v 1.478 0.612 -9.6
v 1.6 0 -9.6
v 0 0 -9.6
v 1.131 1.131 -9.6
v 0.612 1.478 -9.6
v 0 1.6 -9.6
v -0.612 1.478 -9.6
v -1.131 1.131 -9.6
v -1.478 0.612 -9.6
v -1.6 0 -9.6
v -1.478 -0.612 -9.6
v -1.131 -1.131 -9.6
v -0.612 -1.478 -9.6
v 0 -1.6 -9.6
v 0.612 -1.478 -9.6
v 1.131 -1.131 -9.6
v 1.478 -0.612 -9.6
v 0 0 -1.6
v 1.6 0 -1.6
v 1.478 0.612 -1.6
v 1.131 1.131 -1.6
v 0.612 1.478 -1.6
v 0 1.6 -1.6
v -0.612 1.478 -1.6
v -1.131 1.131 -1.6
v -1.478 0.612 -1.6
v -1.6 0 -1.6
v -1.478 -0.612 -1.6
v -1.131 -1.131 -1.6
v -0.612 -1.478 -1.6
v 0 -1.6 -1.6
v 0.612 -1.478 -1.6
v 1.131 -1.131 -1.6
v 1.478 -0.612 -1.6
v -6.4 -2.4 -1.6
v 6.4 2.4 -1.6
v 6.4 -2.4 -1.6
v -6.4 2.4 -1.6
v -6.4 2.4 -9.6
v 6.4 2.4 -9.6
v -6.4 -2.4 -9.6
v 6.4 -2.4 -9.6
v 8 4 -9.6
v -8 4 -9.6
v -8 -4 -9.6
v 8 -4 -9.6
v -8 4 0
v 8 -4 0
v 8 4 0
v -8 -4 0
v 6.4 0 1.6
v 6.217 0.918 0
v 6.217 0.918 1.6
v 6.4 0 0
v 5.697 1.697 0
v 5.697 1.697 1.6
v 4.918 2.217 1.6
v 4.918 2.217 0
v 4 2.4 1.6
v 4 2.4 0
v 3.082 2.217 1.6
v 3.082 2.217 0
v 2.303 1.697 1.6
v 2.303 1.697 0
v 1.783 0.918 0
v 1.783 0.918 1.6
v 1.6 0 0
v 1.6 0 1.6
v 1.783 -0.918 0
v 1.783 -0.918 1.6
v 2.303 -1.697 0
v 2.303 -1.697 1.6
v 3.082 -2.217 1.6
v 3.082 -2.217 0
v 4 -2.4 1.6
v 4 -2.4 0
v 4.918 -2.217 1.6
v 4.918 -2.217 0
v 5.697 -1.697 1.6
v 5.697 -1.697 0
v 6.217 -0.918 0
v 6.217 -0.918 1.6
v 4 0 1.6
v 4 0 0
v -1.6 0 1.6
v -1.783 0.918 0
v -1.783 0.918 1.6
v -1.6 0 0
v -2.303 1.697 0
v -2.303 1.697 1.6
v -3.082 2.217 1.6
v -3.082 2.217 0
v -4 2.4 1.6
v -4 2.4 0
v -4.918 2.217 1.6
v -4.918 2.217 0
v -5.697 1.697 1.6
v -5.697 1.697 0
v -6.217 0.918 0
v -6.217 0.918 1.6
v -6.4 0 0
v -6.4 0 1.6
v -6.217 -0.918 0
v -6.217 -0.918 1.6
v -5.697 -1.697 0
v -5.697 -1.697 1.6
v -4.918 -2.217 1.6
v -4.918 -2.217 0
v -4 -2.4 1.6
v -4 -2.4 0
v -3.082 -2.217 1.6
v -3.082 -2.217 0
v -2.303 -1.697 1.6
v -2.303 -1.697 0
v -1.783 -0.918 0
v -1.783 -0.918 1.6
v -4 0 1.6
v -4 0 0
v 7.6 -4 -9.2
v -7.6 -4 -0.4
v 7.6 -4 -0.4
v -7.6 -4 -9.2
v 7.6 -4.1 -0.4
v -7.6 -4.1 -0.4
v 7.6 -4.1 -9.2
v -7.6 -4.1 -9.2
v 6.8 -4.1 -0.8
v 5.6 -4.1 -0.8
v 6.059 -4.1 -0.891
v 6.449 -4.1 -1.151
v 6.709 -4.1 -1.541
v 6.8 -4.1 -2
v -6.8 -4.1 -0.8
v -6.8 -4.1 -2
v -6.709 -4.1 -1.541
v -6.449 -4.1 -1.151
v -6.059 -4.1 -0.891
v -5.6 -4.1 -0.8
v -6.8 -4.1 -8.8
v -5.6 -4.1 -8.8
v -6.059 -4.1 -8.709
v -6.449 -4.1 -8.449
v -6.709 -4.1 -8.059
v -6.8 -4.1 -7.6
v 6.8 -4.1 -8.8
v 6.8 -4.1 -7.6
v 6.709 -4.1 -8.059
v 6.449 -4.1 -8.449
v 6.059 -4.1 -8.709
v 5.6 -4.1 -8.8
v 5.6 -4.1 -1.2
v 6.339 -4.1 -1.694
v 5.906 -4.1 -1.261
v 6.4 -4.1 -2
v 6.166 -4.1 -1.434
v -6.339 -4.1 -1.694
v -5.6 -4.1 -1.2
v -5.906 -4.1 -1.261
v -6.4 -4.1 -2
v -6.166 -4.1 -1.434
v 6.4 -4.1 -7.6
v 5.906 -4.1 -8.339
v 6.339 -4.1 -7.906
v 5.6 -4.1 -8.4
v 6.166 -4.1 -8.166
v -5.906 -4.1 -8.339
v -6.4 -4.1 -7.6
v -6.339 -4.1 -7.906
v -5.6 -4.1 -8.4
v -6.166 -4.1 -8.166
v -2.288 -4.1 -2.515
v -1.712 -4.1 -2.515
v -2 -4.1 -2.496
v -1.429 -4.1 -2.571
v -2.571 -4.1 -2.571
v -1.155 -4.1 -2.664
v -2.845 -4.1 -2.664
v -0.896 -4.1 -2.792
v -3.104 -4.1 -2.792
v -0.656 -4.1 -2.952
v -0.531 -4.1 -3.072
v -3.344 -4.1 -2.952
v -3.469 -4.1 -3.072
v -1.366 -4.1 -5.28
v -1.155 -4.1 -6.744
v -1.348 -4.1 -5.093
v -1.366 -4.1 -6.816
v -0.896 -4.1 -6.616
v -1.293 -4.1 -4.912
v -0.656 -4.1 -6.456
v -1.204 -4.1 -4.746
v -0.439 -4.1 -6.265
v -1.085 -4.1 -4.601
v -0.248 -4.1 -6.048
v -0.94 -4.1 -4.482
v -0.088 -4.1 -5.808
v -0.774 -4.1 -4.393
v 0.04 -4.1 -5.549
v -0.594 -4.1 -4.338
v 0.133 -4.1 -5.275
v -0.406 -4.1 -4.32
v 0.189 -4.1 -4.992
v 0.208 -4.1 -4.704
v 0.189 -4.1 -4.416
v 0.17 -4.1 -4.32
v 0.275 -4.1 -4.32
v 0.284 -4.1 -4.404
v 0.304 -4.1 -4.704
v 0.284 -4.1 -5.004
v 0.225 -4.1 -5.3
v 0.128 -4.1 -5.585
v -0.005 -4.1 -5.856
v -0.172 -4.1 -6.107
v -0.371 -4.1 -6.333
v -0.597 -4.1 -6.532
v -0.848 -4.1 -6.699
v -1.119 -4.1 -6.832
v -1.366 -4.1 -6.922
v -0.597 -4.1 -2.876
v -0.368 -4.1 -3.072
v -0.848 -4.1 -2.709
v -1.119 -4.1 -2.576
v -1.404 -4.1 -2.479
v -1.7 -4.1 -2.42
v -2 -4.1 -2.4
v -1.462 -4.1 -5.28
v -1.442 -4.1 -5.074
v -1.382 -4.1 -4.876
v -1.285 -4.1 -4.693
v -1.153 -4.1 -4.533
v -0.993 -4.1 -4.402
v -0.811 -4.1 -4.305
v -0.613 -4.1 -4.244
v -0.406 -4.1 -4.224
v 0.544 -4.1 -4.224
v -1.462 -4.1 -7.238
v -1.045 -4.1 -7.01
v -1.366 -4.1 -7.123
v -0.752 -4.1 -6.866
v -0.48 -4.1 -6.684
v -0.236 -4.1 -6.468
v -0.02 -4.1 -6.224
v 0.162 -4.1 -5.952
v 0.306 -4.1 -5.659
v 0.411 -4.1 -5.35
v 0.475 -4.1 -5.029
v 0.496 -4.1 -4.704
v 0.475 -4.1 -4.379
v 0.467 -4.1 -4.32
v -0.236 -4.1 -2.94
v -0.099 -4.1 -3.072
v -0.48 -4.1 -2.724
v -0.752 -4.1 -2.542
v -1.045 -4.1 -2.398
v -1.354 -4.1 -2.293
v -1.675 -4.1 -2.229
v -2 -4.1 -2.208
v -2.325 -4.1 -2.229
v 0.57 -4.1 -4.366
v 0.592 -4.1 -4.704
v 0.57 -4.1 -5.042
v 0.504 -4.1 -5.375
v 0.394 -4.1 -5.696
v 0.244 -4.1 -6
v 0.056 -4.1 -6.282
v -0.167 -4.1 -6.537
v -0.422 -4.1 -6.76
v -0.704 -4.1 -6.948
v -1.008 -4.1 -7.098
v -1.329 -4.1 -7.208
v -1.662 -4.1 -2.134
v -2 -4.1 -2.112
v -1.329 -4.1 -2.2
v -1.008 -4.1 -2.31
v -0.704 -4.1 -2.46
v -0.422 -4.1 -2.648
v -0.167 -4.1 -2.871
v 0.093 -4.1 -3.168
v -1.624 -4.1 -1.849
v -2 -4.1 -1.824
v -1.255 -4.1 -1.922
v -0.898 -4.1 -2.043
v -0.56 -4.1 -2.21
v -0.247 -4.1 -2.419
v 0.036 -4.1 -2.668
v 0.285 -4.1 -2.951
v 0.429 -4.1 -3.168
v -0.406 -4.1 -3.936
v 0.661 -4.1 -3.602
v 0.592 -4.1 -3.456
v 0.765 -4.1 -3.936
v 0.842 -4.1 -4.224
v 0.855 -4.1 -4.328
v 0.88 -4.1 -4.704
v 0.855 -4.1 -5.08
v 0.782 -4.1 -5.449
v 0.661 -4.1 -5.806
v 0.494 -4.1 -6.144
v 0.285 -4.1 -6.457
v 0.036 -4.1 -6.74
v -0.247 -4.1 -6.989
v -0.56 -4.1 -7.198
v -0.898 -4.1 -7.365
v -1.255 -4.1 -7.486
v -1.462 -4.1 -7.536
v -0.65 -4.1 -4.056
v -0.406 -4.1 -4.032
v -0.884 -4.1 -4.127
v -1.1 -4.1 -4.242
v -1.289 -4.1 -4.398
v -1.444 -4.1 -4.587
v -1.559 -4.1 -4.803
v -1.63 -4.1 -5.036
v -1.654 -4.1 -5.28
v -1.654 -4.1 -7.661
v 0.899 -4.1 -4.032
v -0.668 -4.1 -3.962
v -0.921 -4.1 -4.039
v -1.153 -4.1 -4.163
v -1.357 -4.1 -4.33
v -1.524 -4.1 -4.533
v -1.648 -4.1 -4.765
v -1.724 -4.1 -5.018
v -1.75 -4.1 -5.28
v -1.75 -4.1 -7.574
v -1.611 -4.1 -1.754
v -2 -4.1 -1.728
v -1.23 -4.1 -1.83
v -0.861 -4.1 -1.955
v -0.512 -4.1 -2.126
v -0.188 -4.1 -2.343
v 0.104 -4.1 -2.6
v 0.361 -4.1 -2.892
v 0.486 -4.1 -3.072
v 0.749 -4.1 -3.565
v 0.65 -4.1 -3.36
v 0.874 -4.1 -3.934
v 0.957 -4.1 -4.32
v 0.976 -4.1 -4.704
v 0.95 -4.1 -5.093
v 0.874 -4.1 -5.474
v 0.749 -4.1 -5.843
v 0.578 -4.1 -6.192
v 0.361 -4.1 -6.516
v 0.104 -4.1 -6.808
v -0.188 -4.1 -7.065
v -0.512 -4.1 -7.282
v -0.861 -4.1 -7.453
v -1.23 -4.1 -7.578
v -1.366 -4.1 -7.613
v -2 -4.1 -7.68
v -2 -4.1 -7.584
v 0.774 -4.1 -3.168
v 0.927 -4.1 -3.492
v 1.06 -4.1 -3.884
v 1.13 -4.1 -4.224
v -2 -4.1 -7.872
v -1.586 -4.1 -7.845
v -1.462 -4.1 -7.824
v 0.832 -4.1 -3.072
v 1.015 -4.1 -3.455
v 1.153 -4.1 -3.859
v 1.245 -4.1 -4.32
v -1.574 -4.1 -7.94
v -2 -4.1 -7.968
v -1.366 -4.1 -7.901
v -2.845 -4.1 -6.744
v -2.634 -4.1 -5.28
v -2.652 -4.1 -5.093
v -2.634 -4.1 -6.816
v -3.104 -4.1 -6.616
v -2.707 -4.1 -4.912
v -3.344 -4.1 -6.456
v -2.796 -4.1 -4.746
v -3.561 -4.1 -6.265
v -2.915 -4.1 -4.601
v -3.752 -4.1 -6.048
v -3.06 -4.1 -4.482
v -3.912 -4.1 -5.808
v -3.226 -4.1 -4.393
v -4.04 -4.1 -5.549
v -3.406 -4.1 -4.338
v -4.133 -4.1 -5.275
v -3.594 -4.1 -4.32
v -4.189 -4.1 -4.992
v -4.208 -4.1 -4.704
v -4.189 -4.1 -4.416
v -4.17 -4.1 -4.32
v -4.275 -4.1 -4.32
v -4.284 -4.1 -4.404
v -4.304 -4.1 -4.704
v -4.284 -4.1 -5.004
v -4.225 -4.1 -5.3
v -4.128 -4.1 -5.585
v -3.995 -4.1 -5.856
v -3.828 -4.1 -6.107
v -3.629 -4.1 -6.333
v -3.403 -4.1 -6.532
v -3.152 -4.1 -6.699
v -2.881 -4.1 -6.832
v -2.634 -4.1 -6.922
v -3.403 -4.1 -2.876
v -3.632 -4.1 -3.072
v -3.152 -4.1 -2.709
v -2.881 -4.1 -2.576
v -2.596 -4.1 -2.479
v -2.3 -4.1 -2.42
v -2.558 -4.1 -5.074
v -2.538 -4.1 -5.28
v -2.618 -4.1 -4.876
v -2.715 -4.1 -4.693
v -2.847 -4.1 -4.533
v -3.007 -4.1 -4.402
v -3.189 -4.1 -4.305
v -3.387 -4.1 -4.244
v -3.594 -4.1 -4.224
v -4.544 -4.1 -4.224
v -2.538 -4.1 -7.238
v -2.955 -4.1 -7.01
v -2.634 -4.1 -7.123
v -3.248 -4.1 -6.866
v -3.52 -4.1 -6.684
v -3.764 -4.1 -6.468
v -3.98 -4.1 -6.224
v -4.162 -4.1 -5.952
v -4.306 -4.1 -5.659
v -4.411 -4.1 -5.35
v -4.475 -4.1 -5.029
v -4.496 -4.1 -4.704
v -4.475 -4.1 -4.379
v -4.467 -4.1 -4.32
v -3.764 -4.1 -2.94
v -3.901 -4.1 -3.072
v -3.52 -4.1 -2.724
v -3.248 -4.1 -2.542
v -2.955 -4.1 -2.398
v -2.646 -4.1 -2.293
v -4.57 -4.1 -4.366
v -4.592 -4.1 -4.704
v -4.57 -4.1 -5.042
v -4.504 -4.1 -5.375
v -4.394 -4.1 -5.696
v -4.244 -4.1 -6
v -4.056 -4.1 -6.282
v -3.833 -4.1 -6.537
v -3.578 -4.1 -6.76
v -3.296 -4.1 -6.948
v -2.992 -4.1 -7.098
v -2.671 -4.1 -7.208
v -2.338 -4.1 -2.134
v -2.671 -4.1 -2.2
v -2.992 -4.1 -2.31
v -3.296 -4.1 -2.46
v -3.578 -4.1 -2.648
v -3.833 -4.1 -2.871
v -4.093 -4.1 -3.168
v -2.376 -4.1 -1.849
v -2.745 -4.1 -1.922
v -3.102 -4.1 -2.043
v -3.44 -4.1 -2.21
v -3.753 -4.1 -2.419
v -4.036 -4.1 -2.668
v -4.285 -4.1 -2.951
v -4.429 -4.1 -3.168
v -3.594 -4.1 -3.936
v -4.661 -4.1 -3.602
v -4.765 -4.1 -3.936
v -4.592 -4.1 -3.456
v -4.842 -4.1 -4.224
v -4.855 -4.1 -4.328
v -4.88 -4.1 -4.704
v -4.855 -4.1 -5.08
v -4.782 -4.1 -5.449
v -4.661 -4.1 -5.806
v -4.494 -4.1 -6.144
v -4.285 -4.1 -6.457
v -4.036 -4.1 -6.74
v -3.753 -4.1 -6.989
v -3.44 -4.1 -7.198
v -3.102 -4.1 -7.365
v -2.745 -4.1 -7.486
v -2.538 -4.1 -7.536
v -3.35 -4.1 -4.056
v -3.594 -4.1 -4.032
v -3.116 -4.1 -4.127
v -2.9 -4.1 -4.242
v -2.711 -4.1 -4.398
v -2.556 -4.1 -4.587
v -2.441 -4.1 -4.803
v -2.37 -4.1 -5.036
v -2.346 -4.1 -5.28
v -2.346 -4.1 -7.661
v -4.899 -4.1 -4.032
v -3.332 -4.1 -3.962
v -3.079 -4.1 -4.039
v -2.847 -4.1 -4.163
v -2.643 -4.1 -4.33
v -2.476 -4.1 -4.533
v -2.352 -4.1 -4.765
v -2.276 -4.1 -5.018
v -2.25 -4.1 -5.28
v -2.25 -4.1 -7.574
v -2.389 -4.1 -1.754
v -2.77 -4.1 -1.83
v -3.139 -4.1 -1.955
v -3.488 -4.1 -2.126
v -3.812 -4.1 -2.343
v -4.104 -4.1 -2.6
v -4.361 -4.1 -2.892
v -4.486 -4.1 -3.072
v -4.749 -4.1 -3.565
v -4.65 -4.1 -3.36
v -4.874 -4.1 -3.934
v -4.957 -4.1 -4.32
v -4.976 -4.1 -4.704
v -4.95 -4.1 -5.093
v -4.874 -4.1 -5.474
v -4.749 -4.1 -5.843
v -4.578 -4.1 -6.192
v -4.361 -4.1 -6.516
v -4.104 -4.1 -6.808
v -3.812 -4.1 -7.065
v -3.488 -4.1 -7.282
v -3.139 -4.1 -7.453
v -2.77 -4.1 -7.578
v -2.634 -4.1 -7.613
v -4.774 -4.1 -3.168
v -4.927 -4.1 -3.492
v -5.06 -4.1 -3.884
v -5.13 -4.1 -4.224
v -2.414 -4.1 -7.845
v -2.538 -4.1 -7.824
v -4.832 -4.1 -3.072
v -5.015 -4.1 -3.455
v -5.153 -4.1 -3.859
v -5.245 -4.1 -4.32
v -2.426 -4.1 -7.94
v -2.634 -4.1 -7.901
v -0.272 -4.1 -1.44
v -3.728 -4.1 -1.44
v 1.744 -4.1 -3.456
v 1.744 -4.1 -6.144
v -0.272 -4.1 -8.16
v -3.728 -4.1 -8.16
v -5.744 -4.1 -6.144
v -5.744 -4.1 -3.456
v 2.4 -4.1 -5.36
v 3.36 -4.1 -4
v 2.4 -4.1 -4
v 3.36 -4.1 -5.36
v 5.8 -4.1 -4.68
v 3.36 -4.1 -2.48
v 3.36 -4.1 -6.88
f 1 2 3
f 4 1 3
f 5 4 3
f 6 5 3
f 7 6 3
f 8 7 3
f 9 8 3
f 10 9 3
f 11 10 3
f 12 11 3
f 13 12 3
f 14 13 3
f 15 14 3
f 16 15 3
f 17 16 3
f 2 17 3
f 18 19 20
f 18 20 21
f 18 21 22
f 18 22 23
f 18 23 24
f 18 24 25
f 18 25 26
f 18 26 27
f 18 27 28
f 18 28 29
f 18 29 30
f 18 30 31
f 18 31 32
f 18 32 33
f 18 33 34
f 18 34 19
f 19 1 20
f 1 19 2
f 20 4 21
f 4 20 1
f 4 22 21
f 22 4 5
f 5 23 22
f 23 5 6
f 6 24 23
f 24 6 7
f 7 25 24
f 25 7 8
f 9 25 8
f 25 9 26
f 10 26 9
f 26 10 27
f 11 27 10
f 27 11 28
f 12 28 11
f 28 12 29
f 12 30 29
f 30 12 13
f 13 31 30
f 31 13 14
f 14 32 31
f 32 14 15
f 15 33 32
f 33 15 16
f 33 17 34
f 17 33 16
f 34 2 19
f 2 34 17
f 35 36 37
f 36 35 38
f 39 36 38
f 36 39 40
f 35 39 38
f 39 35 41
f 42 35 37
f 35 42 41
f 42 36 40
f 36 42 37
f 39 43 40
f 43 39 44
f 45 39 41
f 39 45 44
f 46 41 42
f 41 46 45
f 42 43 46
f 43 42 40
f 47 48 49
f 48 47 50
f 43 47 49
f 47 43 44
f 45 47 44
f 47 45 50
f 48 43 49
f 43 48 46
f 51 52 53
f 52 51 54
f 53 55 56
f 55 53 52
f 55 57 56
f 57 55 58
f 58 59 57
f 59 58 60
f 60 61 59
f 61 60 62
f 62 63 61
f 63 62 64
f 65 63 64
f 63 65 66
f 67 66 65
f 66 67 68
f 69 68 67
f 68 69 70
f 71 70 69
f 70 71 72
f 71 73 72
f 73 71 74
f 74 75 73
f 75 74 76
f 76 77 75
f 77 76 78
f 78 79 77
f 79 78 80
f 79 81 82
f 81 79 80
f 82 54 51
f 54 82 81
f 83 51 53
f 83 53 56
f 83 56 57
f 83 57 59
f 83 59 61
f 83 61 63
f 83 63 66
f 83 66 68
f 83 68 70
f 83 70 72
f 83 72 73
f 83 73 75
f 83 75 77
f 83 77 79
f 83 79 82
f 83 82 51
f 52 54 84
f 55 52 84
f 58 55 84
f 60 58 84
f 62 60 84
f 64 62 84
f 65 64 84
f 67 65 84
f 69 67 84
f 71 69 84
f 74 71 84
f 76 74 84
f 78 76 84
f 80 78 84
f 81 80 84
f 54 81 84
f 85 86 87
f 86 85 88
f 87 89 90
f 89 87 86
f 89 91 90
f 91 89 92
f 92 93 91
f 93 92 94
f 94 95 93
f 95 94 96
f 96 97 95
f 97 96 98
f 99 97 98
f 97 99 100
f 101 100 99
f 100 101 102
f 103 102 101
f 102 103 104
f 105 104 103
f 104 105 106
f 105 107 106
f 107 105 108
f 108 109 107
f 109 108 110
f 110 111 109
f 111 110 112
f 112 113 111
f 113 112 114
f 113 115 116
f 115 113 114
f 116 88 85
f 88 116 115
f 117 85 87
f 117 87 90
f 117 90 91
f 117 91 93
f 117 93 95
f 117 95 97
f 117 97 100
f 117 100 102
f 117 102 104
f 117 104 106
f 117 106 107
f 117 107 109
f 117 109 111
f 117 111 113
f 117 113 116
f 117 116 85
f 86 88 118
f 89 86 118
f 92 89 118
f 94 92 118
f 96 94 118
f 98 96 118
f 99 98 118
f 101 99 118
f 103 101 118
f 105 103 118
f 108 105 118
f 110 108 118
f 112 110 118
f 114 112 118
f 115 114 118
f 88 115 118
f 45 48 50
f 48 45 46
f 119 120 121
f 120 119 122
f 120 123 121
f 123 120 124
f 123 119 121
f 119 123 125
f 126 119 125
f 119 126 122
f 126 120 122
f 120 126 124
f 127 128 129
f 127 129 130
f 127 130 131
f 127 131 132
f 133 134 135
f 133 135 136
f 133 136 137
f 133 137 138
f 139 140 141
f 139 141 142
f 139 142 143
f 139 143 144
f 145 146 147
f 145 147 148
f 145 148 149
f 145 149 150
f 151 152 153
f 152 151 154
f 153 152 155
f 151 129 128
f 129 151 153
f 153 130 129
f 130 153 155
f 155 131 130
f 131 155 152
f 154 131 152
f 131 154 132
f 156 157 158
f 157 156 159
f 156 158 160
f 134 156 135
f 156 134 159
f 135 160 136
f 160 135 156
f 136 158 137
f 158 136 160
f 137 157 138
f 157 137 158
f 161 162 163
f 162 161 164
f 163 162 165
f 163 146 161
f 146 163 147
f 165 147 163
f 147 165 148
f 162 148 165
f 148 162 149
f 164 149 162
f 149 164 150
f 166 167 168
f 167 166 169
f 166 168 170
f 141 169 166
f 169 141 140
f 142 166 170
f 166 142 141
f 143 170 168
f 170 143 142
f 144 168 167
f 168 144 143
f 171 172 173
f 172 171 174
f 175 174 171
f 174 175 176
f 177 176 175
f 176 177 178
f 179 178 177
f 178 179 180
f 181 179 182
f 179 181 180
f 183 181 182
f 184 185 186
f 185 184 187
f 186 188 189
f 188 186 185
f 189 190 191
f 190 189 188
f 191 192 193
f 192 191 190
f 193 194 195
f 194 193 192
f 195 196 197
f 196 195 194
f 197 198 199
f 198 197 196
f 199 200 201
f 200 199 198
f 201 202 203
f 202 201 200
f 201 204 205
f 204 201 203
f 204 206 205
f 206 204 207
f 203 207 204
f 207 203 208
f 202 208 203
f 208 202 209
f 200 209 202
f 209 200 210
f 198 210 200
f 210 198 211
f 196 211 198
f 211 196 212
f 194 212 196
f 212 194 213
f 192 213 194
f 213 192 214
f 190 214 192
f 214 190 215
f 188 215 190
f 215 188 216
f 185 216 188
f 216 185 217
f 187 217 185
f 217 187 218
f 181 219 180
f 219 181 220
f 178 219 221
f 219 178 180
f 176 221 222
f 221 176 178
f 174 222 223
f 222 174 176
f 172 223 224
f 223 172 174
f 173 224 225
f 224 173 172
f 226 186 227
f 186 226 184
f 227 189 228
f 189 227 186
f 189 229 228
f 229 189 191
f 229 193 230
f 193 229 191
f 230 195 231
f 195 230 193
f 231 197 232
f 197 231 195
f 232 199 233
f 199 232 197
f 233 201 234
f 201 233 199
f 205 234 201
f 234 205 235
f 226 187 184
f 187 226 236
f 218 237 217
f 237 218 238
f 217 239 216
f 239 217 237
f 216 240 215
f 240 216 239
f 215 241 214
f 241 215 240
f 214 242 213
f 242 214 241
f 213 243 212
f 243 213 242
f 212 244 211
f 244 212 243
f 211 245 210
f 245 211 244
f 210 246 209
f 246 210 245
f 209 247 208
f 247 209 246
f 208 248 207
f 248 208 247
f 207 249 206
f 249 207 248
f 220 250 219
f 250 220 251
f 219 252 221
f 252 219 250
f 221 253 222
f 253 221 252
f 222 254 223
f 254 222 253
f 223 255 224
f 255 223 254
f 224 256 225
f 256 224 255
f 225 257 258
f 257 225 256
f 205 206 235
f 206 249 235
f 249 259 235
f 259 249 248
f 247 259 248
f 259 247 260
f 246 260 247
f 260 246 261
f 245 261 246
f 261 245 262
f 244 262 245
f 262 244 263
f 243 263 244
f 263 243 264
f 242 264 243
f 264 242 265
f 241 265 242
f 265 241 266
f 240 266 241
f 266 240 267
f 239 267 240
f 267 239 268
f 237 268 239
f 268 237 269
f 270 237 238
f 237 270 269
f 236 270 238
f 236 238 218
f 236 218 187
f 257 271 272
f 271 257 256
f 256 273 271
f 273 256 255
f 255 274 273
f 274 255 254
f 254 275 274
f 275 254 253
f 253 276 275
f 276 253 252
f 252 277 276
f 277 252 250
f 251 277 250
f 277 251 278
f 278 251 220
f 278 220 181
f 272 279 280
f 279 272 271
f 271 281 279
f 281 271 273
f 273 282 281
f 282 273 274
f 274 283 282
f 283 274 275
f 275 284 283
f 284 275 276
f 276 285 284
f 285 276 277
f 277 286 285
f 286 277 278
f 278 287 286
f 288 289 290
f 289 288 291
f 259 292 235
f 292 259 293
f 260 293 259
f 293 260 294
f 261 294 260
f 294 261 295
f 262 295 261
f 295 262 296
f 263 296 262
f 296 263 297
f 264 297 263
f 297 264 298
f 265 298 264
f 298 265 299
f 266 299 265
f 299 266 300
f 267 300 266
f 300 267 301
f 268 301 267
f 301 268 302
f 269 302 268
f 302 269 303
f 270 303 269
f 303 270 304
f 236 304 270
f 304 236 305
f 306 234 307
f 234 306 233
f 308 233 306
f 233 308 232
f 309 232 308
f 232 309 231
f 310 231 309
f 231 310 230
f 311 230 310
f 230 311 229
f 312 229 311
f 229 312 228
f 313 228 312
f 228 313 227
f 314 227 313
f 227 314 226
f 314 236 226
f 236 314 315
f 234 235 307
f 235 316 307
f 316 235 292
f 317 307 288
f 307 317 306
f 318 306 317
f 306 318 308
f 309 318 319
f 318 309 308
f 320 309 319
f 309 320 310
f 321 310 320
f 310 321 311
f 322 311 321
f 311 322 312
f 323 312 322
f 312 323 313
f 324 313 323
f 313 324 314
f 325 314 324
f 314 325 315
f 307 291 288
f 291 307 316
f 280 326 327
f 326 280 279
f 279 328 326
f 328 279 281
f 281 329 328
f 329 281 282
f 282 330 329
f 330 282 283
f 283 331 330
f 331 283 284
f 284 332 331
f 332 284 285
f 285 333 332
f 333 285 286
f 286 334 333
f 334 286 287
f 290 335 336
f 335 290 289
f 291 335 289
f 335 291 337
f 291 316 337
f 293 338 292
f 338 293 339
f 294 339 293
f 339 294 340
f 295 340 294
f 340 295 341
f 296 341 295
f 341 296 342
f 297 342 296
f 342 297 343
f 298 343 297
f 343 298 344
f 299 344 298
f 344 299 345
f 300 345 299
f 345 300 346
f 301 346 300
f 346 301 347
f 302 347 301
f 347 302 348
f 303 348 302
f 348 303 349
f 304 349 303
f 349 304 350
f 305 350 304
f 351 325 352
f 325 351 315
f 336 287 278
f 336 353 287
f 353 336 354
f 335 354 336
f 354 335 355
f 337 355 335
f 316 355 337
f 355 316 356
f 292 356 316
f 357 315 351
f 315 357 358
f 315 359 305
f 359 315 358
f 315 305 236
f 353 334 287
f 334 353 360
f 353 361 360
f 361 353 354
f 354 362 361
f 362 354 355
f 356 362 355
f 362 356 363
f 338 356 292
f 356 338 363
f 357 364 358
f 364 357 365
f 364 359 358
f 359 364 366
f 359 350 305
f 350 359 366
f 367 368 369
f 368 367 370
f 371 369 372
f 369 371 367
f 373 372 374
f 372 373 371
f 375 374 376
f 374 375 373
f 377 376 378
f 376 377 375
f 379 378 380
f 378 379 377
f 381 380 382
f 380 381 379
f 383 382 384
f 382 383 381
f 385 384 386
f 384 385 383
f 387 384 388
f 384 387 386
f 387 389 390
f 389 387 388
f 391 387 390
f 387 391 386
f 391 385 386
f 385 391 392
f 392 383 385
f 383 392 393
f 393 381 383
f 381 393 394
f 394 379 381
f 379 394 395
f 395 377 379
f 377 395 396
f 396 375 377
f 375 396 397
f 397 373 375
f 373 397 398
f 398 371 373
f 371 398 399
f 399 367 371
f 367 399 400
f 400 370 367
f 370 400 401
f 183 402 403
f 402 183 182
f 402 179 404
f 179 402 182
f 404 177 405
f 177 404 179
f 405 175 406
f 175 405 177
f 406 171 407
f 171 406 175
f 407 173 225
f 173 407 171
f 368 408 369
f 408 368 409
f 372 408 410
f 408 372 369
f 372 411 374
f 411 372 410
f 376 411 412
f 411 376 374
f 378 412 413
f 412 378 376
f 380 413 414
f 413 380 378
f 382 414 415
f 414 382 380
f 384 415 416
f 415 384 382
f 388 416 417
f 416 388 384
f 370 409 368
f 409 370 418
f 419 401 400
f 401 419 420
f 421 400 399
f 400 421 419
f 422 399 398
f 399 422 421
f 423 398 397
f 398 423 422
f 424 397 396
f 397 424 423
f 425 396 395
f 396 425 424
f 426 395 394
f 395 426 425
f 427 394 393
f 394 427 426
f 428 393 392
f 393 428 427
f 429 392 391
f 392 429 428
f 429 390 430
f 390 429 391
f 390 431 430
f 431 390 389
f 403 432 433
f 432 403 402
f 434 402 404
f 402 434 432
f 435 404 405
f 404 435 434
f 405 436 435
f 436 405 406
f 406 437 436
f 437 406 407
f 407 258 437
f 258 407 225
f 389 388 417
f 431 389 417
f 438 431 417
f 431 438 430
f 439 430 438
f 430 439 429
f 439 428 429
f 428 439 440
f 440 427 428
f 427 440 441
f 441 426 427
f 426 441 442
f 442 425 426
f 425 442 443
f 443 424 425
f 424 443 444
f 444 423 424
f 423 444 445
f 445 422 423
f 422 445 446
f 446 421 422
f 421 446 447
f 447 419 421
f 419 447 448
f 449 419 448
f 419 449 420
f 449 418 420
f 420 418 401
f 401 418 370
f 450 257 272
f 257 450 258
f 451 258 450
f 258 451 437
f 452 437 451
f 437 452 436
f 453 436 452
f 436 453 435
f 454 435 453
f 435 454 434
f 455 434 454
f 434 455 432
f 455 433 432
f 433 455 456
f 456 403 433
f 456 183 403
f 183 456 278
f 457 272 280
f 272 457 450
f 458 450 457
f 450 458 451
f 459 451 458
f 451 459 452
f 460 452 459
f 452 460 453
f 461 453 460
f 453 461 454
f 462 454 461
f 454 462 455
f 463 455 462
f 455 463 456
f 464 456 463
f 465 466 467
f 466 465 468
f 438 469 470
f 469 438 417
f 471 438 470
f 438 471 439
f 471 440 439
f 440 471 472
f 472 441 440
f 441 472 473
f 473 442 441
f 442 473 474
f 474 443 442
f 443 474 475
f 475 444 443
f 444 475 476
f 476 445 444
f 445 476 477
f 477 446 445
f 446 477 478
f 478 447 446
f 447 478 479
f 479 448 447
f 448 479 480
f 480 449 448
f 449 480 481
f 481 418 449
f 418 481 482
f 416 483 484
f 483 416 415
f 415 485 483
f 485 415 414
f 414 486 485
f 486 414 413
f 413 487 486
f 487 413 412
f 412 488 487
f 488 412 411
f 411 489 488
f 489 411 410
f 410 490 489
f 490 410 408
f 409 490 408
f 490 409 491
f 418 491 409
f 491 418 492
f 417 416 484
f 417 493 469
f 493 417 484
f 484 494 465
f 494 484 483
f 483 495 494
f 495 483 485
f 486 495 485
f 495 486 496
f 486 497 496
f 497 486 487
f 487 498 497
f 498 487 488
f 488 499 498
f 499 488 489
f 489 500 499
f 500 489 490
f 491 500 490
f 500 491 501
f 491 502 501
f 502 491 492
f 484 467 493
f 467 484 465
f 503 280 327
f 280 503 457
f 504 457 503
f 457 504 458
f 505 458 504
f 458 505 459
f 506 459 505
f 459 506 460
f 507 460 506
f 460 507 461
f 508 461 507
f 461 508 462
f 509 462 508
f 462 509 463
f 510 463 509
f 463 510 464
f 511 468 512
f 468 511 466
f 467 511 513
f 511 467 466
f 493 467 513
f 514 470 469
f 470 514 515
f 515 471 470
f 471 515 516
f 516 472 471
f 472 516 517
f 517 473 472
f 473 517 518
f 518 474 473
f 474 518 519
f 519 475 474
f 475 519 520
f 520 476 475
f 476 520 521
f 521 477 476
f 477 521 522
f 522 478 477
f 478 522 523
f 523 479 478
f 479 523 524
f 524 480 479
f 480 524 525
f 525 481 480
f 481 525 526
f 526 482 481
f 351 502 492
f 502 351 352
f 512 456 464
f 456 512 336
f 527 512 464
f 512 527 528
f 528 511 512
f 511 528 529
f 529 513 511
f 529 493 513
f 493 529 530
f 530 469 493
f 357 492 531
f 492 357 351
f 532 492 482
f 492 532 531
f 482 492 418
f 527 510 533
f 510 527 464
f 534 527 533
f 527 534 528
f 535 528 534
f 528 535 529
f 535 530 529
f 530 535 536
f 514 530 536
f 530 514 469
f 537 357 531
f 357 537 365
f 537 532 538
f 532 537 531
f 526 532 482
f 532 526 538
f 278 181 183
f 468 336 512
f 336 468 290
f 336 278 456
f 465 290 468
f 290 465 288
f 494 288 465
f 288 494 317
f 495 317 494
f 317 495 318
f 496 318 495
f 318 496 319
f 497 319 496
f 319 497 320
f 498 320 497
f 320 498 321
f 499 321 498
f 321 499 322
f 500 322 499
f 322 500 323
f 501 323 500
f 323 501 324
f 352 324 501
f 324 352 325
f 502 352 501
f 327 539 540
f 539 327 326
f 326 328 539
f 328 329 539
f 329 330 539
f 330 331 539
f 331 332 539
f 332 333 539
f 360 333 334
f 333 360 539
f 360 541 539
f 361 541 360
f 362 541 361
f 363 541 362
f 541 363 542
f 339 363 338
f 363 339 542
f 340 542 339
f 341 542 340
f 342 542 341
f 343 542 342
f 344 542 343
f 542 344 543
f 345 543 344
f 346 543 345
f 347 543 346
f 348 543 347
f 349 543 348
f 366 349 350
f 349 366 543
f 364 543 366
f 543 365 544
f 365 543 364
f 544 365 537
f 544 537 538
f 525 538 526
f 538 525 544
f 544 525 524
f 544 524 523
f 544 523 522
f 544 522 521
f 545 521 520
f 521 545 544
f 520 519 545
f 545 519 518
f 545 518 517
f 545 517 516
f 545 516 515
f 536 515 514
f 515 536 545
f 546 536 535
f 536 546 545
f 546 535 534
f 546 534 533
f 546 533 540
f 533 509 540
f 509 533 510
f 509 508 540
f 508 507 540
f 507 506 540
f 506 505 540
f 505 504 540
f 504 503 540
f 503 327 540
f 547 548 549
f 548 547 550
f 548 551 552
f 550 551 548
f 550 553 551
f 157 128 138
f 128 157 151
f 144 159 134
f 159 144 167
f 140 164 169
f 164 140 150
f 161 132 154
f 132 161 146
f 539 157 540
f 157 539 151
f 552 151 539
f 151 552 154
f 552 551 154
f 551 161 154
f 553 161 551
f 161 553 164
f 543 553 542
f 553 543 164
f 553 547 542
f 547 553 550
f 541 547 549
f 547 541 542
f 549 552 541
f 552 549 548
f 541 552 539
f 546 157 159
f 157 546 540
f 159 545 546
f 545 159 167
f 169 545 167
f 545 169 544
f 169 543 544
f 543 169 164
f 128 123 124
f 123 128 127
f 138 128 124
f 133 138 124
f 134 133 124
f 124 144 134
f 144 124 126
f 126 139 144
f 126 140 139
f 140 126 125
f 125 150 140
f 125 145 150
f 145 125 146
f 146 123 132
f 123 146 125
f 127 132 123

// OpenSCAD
use <../lib.scad>
use <163555i.scad>
use <3004.scad>
function ldraw_lib__3004d00() = [
// 0 Brick  1 x  2 with Monorail Station Direction Signs Right Sticker
// 0 Name: 3004d00.dat
// 0 Author: Takeshi Takahashi [RainbowDolphin]
// 0 !LDRAW_ORG Shortcut UPDATE 2024-07
// 0 !LICENSE Licensed under CC BY 4.0 : see CAreadme.txt
// 
// 0 BFC CERTIFY CCW
  [0,"BFC","CERTIFY"],
  [0,"BFC","CCW"],
// 
// 0 !CATEGORY Sticker Shortcut
// 0 !KEYWORDS Airport Shuttle, Bricklink 3004pb021R, set 6399
// 
// 0 !HISTORY 2024-08-26 [OrionP] Official Update 2024-07
// 
// 1 16 0 0 0 1 0 0 0 1 0 0 0 1 3004.dat
  [1,16,0,0,0,1,0,0,0,1,0,0,0,1, ldraw_lib__3004()],
// 1 16 0 12 -10 1 0 0 0 0 -1 0 1 0 163555i.dat
  [1,16,0,12,-10,1,0,0,0,0,-1,0,1,0, ldraw_lib__163555i()],
];
module ldraw_lib__3004d00(step=0, col=false, unit=2/5, alt=false, line=0.2, solid=!$preview)
    makepoly(ldraw_lib__3004d00(), step=step, col=col, unit=unit, alt=alt, line=line, solid=solid);
ldraw_lib__3004d00(line=0.2);
